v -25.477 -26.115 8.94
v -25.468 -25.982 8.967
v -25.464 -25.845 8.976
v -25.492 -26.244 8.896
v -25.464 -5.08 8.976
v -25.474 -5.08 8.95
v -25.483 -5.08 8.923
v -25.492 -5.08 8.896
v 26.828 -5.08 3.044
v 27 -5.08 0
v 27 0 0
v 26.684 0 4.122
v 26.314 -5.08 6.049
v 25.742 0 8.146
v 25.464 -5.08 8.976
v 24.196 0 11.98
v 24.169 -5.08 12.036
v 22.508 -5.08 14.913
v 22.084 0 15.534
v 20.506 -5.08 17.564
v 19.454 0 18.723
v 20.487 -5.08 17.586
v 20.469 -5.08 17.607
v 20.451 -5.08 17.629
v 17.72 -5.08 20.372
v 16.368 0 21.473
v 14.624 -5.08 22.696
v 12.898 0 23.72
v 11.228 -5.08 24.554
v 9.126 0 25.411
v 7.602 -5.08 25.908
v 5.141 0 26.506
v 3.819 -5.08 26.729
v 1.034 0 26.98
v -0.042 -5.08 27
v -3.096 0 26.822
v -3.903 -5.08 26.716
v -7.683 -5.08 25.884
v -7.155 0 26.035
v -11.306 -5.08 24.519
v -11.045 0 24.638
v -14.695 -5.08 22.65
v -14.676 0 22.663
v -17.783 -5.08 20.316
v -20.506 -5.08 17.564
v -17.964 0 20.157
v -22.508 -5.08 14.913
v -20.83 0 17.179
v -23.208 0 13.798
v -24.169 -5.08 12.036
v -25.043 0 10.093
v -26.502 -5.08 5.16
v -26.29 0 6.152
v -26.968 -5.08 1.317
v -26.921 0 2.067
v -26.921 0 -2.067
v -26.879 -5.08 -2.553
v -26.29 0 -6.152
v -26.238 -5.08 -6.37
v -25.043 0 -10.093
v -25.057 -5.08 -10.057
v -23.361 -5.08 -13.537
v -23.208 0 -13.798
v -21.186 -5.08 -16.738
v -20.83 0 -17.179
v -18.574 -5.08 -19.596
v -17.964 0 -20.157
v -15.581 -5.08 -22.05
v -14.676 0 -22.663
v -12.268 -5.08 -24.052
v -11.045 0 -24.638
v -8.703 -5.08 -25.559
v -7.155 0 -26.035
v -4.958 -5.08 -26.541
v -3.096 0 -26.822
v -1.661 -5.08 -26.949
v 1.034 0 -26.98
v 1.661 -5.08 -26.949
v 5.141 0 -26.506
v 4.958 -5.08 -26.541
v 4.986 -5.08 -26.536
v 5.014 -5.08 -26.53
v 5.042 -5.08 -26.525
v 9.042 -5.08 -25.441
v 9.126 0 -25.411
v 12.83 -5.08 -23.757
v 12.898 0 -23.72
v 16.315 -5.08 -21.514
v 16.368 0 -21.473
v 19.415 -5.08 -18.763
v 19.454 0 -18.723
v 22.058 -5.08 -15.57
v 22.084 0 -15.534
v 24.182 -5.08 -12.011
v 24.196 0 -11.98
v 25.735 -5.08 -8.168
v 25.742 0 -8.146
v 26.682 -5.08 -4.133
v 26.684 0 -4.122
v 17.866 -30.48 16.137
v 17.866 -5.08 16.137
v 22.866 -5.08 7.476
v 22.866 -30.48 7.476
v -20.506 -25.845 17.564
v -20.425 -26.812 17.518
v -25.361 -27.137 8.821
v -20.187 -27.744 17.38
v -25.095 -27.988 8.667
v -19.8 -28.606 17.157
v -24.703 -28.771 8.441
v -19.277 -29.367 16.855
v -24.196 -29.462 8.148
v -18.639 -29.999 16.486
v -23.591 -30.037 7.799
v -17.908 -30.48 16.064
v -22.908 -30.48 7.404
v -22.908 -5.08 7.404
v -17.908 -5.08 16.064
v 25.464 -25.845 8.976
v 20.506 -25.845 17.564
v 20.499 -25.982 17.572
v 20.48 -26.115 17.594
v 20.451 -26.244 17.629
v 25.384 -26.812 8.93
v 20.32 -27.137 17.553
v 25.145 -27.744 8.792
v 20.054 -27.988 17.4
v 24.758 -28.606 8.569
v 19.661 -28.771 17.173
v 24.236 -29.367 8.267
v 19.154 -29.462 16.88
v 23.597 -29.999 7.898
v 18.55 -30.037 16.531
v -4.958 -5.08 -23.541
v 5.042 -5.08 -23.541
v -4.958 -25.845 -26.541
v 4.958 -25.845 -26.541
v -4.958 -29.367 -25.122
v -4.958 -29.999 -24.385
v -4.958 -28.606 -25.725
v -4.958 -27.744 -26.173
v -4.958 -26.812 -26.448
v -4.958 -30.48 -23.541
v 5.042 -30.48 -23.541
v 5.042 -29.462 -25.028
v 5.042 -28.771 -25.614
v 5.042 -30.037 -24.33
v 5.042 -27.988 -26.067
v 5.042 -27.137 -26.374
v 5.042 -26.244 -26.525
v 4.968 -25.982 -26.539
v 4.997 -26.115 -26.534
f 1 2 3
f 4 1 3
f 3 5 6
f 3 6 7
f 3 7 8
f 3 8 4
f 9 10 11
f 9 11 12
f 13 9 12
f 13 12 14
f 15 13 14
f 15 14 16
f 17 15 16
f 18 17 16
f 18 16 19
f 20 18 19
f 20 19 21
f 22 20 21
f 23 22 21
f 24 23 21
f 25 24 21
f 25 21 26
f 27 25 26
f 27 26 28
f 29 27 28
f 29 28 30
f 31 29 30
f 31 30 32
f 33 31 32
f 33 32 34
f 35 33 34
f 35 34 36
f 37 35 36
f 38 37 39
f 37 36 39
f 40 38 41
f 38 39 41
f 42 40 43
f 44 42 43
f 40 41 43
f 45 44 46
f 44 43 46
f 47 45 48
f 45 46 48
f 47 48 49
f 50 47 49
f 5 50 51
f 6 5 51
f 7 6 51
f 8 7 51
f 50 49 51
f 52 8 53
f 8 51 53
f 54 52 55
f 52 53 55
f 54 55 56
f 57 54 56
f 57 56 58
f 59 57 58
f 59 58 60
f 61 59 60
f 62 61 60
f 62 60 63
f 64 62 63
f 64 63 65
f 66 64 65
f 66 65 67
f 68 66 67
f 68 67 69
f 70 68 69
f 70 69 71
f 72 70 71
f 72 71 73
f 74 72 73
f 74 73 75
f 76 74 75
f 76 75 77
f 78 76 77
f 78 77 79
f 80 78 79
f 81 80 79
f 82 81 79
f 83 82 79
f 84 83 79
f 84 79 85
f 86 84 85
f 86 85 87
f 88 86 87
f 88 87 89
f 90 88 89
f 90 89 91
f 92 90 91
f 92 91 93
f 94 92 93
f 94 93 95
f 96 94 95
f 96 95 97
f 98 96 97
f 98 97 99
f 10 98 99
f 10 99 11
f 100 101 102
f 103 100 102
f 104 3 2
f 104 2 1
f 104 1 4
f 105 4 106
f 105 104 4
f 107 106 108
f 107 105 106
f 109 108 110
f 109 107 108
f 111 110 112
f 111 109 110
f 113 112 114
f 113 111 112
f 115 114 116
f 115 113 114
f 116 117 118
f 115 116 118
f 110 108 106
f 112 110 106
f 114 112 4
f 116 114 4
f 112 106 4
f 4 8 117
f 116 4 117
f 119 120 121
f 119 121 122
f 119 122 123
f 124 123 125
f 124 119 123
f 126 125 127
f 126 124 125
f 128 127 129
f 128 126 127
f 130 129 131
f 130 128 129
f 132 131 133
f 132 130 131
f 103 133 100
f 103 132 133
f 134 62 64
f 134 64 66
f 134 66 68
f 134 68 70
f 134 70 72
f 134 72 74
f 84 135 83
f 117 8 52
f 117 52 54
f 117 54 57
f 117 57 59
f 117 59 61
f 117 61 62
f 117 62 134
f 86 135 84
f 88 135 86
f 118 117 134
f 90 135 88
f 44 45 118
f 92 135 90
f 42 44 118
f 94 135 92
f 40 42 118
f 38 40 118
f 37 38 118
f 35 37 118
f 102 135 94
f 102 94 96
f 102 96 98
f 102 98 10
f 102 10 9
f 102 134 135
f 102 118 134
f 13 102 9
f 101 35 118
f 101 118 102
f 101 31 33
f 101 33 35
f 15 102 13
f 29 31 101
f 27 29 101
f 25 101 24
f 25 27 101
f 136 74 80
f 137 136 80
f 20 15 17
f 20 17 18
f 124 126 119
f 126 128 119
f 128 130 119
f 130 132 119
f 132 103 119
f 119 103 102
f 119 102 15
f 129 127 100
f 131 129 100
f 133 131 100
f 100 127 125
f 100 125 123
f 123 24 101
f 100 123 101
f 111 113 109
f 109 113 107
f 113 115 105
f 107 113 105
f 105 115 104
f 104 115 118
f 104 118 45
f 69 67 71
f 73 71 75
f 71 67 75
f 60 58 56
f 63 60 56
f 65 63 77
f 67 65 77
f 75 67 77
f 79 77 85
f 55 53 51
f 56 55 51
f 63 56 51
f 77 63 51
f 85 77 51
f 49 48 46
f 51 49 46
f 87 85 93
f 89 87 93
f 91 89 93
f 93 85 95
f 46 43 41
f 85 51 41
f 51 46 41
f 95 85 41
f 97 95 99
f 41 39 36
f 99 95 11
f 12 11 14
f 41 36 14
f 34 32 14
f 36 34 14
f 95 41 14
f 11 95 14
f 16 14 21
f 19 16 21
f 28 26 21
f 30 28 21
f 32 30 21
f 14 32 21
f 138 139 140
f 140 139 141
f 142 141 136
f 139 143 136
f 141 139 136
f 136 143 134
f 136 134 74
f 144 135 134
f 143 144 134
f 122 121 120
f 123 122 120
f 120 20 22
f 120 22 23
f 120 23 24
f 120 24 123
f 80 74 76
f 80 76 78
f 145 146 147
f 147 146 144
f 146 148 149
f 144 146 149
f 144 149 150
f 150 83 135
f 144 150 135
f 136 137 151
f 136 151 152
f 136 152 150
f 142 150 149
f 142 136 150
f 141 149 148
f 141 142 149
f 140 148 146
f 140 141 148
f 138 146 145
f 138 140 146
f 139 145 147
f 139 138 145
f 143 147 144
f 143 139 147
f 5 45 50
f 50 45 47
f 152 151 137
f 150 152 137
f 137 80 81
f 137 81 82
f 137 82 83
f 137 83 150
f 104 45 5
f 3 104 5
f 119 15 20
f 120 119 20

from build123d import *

# Parameters (mm, degrees)
F0_R        = 27
F1_DEPTH    = 5.08
F3_DEPTH    = 25.4
F4_T1_DEPTH = 33.0899649141
F4_T3_DEPTH = 33.0899649141
F4_T5_DEPTH = 33.0899649141


# Not quite as in the source:
# - a fillet or chamfer that OpenCascade refuses, or shapes differently, is made with other operations: its cross-section is extruded or revolved along the edge and cut away or added


with BuildPart() as f1:
    # F0 (on Front) → F1 (new body)
    with BuildSketch(Plane.XZ):
        Circle(F0_R)
    extrude(amount=F1_DEPTH)

    # F2 (on face) → F3 (join)
    with BuildSketch(Plane.XZ.offset(5.08)):
        with BuildLine():
            ThreePointArc((-25.4641942221, 8.9763473985), (-25.4782526607, 8.9363662278), (-25.4922483252, 8.8963630393))
            Line((-25.4922483252, 8.8963630393), (-22.90776578, 7.4042113462))
            Line((-22.90776578, 7.4042113462), (-17.90776578, 16.064465384))
            Line((-17.90776578, 16.064465384), (-20.5058419913, 17.564465384))
            Line((-20.5058419913, 17.564465384), (-25.4641942221, 8.9763473985))
        make_face()
        with BuildLine():
            Line((22.8661180108, 7.4763473985), (25.4641942221, 8.9763473985))
            Line((25.4641942221, 8.9763473985), (20.5058419913, 17.564465384))
            ThreePointArc((20.5058419913, 17.564465384), (20.4782465011, 17.5966309343), (20.4506005559, 17.6287531295))
            Line((20.4506005559, 17.6287531295), (17.8661180108, 16.1366014363))
            Line((17.8661180108, 16.1366014363), (22.8661180108, 7.4763473985))
        make_face()
        with BuildLine():
            Line((-4.9583522308, -23.5408127825), (-4.9583522308, -26.5408127825))
            Line((-4.9583522308, -26.5408127825), (4.9583522308, -26.5408127825))
            ThreePointArc((4.9583522308, -26.5408127825), (5.0000061596, -26.5329971621), (5.0416477692, -26.5251161689))
            Line((5.0416477692, -26.5251161689), (5.0416477692, -23.5408127825))
            Line((5.0416477692, -23.5408127825), (-4.9583522308, -23.5408127825))
        make_face()
    extrude(amount=F3_DEPTH)

    # F4: fillet of radius 5.08 on 3 edges, made by hand

    # F4_s2 → F4_t1 (cut)
    with BuildSketch(Plane(origin=(8.2724912285, 0, 14.328375113), x_dir=(0, 1, 0), z_dir=(-0.5, 0, -0.8660254038))):
        with BuildLine():
            ThreePointArc((-25.8453479095, -26.5408127825), (-28.6057826579, -25.7253643416), (-30.48, -23.5408127825))
            Line((-30.48, -23.5408127825), (-30.48, -26.5408127825))
            Line((-30.48, -26.5408127825), (-25.8453479095, -26.5408127825))
        make_face()
    extrude(amount=F4_T1_DEPTH, mode=Mode.SUBTRACT)

    # F4_s4 → F4_t3 (cut)
    with BuildSketch(Plane.YZ.offset(-16.544982457)):
        with BuildLine():
            ThreePointArc((-25.8453479095, -26.5408127825), (-28.6057826579, -25.7253643416), (-30.48, -23.5408127825))
            Line((-30.48, -23.5408127825), (-30.48, -26.5408127825))
            Line((-30.48, -26.5408127825), (-25.8453479095, -26.5408127825))
        make_face()
    extrude(amount=F4_T3_DEPTH, mode=Mode.SUBTRACT)

    # F4_s6 → F4_t5 (cut)
    with BuildSketch(Plane(origin=(8.2724912285, 0, -14.328375113), x_dir=(0, 1, 0), z_dir=(-0.5, 0, 0.8660254038))):
        with BuildLine():
            ThreePointArc((-25.8453479095, -26.5408127825), (-28.6057826579, -25.7253643416), (-30.48, -23.5408127825))
            Line((-30.48, -23.5408127825), (-30.48, -26.5408127825))
            Line((-30.48, -26.5408127825), (-25.8453479095, -26.5408127825))
        make_face()
    extrude(amount=F4_T5_DEPTH, mode=Mode.SUBTRACT)


solid = f1.part
